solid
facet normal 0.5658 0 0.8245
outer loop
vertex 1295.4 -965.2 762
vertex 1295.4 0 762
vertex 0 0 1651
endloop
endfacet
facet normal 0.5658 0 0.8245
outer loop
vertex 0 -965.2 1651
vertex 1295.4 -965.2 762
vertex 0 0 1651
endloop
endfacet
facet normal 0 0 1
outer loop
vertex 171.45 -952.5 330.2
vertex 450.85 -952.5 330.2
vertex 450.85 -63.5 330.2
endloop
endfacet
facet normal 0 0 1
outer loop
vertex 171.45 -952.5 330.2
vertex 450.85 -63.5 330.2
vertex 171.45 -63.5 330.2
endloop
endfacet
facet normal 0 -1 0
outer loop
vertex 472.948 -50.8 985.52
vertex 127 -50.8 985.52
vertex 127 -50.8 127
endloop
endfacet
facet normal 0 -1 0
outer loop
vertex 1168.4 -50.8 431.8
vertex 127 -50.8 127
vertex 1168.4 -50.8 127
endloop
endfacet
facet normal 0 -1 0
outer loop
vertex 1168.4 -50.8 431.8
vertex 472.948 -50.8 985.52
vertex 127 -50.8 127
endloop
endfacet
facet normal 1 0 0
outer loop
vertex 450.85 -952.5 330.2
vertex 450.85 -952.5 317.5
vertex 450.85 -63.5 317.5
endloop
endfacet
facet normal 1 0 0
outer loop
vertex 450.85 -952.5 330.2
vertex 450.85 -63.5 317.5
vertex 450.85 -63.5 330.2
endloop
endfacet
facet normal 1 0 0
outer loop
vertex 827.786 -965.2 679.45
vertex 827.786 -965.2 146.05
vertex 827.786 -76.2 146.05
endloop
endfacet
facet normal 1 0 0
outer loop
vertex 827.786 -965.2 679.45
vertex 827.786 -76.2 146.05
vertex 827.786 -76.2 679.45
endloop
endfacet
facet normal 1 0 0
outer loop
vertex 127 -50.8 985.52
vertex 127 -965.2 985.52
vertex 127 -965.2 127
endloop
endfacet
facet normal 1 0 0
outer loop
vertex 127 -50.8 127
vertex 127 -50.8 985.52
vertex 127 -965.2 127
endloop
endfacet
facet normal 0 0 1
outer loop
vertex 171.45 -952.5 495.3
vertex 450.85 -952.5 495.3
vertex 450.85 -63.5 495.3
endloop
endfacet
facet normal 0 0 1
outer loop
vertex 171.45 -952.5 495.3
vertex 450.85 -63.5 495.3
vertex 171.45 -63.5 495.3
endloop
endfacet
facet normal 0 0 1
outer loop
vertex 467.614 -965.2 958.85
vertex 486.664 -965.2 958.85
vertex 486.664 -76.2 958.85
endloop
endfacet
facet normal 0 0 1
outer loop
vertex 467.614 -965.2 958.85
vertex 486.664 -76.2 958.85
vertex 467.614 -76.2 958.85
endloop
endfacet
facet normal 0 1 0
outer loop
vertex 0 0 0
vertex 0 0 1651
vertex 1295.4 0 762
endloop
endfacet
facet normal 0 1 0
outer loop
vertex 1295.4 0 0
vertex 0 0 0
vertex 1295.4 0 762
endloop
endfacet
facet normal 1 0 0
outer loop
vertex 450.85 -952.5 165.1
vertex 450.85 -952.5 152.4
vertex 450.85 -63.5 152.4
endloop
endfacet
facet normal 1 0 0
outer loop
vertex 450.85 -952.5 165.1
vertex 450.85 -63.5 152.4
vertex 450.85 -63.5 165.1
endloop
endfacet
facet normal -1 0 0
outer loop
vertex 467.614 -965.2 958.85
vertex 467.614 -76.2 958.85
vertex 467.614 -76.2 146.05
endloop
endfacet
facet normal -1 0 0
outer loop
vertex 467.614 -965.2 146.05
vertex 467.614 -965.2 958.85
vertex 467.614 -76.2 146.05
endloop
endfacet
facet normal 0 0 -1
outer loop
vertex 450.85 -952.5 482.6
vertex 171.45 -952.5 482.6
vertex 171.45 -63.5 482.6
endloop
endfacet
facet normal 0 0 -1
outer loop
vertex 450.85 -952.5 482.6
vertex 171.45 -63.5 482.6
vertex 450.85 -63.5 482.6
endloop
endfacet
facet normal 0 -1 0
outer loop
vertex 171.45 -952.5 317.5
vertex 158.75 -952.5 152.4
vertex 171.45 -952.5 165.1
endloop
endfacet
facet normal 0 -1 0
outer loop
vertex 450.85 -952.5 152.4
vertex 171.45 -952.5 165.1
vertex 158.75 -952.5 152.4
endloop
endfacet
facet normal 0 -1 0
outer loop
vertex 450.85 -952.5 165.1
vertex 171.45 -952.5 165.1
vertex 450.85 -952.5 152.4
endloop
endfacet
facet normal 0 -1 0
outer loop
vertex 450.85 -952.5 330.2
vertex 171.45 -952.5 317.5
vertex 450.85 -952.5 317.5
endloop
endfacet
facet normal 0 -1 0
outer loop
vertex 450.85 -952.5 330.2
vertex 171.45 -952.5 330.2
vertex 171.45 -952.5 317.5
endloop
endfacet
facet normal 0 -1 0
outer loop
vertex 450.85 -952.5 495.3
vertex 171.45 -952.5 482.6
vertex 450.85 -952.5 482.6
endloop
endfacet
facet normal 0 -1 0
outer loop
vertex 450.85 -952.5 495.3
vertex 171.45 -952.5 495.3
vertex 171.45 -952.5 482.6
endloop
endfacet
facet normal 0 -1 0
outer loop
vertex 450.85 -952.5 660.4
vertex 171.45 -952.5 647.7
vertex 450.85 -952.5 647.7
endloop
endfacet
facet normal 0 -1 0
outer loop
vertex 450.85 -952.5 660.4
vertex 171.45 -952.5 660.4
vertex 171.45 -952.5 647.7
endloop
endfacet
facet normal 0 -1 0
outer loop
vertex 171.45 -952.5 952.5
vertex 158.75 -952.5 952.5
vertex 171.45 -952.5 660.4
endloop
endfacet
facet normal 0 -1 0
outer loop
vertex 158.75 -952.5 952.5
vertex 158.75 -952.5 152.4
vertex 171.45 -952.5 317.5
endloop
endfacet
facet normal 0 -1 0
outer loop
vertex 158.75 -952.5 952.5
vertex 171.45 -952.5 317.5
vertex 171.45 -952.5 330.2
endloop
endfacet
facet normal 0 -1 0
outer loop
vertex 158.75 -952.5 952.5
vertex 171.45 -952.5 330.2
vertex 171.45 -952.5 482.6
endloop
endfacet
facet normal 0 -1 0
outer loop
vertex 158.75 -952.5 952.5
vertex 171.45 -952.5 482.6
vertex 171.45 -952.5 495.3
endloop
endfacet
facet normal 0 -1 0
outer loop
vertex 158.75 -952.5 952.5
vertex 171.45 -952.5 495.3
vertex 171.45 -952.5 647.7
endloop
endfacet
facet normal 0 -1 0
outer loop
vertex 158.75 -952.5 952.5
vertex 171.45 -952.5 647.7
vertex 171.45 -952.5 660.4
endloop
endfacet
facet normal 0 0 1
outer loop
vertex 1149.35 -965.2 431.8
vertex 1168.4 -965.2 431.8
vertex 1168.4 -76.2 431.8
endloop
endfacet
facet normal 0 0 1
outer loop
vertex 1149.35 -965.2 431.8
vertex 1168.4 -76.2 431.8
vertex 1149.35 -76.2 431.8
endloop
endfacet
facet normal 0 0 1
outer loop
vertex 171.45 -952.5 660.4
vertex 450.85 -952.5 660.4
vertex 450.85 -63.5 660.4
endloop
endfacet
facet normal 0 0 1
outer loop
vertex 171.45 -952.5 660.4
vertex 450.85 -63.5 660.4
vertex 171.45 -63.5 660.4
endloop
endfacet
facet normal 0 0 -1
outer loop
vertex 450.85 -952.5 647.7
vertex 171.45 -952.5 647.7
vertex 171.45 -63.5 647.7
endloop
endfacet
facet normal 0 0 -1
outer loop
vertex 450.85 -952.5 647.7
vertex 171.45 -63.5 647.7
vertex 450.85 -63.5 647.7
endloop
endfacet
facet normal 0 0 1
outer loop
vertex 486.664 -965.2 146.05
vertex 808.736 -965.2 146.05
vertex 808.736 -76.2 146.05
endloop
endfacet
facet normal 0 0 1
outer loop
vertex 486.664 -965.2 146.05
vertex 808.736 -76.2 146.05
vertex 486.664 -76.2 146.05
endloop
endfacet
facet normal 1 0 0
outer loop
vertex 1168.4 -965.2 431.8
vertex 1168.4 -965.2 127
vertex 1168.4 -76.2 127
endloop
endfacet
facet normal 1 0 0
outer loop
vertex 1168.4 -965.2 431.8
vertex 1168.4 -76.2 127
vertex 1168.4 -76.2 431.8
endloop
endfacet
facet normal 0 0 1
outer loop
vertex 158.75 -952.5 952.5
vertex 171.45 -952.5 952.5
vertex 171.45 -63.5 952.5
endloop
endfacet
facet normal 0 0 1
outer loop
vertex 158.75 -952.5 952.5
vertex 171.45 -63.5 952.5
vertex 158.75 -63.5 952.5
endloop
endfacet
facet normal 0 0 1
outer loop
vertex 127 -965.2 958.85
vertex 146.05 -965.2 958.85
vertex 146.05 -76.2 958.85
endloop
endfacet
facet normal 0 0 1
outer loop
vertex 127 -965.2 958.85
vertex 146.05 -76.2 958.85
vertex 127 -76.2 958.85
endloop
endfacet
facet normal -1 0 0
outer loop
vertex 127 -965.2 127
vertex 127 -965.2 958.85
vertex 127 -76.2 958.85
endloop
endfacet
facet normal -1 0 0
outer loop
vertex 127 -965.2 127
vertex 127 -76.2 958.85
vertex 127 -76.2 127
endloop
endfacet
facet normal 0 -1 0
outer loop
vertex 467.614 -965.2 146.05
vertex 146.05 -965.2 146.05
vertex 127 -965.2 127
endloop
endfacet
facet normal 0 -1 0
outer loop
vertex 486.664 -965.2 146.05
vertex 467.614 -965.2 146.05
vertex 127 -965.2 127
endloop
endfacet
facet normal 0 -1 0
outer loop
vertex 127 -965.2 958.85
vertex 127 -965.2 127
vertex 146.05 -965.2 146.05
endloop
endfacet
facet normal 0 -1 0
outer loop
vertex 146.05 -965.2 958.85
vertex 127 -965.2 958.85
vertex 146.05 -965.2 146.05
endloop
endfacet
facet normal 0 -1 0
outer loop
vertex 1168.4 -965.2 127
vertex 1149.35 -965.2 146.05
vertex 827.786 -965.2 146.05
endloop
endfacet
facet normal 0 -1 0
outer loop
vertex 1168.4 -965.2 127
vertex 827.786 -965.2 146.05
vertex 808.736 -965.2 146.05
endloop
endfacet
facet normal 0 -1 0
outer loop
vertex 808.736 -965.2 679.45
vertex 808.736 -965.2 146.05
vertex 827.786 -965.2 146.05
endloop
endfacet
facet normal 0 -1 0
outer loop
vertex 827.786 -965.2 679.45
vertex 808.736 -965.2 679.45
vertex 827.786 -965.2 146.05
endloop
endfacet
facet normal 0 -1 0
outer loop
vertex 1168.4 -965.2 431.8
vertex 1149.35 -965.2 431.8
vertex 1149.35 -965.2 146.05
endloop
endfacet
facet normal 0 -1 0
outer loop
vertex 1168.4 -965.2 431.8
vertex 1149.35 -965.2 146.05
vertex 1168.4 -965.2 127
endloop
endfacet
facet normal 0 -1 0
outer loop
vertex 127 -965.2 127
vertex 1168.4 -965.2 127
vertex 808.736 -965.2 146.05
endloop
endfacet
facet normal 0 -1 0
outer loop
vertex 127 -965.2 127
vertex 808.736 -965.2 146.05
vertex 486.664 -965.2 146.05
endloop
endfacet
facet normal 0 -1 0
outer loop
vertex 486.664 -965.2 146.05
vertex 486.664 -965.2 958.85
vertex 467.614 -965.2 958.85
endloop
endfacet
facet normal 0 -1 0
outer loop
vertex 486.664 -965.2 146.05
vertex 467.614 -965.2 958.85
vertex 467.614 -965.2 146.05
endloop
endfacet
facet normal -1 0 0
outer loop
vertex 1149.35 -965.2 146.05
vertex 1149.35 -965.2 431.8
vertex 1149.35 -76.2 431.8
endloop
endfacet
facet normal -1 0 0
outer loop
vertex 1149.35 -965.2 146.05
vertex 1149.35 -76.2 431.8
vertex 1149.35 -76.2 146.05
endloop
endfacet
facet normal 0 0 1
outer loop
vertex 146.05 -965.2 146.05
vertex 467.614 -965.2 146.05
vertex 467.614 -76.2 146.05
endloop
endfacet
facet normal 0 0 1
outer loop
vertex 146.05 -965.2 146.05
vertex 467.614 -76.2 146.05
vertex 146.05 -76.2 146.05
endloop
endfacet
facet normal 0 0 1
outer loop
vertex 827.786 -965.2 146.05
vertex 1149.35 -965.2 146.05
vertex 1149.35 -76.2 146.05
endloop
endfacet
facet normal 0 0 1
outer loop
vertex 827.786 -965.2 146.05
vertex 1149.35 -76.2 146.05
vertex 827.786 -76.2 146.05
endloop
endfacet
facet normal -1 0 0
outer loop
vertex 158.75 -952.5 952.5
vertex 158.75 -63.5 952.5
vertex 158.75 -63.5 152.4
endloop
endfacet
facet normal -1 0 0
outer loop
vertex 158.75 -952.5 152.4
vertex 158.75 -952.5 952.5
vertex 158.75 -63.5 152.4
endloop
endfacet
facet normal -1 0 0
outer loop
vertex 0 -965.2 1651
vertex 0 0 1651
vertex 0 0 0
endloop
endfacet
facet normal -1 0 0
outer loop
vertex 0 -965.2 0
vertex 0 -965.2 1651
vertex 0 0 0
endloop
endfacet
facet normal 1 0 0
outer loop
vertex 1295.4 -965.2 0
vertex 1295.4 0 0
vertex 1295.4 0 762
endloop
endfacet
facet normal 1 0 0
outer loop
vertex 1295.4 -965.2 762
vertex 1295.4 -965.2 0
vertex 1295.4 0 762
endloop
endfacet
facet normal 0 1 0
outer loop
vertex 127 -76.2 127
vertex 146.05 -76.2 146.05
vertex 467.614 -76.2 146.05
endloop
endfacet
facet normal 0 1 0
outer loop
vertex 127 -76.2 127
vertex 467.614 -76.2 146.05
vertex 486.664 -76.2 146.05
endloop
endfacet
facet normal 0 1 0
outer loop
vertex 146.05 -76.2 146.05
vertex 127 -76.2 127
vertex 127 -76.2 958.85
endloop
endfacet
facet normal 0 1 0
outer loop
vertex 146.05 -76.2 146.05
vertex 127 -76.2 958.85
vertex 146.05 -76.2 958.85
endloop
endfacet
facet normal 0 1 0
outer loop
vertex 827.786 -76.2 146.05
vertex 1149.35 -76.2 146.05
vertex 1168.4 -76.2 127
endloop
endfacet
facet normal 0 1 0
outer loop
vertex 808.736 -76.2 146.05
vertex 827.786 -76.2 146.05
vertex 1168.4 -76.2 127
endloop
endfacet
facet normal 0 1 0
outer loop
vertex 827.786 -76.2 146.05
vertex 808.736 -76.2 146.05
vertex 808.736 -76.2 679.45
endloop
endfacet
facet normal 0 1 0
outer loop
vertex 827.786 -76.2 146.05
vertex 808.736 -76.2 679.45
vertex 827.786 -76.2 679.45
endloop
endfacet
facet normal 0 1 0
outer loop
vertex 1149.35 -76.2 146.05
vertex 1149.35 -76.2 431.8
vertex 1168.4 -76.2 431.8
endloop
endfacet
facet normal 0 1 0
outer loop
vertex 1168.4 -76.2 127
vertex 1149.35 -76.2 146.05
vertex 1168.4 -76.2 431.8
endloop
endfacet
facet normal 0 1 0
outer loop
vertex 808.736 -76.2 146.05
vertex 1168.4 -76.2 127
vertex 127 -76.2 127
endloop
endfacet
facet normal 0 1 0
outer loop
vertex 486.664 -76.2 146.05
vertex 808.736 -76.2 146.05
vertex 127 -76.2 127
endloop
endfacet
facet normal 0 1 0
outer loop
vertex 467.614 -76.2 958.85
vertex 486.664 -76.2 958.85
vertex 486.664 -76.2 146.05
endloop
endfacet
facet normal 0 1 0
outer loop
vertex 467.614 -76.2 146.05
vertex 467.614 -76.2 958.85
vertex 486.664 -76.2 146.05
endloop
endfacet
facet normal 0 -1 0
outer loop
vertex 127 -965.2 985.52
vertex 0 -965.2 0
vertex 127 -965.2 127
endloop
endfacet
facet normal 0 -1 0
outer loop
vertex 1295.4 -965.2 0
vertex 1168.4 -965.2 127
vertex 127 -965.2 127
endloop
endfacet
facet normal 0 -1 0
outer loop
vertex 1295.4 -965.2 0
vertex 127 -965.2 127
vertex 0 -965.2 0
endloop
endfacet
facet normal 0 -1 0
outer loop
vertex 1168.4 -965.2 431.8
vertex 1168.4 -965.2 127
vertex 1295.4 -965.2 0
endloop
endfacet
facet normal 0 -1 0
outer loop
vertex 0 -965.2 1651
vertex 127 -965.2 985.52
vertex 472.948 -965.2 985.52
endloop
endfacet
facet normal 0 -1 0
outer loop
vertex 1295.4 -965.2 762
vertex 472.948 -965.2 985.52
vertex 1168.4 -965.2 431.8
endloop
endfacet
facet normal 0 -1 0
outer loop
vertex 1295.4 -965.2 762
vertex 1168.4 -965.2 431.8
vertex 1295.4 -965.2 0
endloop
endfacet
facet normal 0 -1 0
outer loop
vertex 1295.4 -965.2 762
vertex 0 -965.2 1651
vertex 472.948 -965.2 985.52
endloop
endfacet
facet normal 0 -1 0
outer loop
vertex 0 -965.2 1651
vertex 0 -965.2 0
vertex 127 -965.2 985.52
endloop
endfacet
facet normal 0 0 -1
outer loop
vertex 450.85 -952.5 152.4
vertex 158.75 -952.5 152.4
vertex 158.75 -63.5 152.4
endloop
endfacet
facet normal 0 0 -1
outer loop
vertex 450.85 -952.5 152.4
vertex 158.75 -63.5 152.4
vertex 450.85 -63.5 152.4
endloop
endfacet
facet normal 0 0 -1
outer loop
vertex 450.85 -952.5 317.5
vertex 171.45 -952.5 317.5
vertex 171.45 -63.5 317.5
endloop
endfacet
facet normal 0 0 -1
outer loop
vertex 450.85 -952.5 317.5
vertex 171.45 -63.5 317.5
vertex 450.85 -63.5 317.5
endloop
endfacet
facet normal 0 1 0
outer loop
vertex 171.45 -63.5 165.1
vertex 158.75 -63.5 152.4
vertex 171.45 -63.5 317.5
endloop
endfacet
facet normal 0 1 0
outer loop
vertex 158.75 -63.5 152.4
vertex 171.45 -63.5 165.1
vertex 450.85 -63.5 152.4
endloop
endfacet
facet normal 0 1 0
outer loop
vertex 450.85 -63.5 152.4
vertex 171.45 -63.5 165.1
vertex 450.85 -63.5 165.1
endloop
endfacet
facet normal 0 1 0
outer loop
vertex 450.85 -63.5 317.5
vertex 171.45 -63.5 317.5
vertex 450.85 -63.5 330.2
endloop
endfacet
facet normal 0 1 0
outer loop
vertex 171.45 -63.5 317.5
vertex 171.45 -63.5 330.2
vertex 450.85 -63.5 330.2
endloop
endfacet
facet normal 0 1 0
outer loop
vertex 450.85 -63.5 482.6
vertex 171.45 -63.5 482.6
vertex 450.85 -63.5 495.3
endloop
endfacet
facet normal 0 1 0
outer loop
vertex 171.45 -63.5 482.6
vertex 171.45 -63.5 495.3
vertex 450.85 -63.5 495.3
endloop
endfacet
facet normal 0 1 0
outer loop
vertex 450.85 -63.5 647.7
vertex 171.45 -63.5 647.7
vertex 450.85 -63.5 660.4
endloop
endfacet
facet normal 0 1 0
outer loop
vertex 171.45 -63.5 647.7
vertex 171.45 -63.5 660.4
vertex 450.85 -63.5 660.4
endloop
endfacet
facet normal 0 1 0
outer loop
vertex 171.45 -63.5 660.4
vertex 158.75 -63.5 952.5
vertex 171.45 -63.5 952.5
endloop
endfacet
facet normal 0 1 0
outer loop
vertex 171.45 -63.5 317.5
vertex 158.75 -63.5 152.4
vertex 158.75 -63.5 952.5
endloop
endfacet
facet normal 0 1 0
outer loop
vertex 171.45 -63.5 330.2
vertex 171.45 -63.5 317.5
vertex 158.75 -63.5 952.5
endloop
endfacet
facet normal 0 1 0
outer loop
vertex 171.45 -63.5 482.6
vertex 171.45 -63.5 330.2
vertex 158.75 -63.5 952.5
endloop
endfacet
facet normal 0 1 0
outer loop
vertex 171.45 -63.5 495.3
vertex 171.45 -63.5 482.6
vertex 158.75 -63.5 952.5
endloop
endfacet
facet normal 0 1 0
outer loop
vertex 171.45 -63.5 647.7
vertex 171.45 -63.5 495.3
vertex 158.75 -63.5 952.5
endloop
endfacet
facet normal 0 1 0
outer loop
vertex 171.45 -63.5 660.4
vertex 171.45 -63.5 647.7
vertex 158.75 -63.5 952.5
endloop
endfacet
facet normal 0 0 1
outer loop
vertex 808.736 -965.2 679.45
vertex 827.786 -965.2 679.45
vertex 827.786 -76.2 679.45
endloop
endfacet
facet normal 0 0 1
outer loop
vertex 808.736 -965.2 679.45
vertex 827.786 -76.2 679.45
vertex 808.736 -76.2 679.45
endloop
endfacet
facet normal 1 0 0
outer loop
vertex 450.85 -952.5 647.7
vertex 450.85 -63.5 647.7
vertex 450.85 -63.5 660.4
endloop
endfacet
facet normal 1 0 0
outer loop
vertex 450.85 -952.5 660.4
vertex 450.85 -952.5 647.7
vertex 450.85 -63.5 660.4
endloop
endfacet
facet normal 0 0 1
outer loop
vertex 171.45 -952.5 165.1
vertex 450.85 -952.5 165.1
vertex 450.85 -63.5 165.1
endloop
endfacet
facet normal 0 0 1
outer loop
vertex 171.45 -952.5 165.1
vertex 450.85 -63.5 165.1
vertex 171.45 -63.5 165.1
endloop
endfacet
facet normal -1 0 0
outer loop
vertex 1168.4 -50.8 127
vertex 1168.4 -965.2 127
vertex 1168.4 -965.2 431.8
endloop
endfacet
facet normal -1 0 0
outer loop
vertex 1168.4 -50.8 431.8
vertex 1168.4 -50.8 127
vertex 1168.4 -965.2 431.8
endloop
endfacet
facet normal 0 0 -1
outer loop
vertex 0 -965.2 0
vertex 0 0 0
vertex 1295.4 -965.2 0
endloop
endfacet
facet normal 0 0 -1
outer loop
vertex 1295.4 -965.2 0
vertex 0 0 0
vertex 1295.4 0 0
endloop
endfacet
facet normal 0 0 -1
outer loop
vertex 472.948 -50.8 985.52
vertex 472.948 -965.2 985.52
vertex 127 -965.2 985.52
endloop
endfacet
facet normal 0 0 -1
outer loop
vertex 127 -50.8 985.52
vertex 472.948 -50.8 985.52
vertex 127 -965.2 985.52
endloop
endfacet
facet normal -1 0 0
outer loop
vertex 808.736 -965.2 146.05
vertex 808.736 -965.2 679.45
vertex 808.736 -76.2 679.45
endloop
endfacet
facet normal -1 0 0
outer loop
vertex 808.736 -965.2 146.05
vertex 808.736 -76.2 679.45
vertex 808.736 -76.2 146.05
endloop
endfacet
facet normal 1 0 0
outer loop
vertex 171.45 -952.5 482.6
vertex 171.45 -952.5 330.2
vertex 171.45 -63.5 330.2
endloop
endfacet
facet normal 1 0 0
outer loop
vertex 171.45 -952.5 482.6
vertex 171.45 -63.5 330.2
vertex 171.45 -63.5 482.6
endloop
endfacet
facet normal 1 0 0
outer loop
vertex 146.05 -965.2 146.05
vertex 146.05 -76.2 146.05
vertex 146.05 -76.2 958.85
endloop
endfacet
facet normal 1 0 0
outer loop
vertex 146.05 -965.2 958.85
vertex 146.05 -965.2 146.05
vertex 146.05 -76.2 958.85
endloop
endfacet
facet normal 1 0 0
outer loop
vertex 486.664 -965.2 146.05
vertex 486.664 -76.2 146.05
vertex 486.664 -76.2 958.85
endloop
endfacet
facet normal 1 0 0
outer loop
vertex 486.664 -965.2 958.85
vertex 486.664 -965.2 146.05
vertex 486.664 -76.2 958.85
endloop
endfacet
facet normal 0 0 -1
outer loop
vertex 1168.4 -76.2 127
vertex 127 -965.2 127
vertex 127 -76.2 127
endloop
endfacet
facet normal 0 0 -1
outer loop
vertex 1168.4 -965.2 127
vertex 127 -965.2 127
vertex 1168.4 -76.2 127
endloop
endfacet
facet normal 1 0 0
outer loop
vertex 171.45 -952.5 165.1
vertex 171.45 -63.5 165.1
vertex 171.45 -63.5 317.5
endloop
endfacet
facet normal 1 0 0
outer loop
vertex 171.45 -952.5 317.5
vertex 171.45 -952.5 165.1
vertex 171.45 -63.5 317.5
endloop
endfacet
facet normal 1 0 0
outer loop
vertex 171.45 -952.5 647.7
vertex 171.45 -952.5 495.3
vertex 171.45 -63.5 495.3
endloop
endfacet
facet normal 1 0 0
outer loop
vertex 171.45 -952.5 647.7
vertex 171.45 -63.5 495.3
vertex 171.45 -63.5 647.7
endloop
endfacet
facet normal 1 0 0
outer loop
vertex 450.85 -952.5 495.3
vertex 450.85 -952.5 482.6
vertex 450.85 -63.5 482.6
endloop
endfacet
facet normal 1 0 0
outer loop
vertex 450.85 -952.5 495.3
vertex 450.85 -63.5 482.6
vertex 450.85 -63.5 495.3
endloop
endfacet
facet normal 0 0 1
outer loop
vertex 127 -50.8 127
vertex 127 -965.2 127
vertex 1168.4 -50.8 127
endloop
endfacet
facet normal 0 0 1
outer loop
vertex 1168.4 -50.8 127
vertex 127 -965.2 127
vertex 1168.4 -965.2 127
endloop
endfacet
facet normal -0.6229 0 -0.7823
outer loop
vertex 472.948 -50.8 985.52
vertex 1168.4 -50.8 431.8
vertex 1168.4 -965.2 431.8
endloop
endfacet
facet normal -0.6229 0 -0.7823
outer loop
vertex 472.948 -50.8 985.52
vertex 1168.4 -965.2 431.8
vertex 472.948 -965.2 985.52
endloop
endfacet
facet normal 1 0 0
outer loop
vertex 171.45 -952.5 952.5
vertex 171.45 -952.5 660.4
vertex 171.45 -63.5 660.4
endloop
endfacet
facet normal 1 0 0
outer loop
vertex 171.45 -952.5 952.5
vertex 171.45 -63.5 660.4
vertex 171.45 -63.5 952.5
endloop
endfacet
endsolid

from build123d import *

# Parameters (mm, degrees)
F1_DEPTH = 965.2
F3_DEPTH = 914.4
F5_DEPTH = 889
F8_DEPTH = 889


with BuildPart() as f1:
    # F0 (on Front) → F1 (new body)
    with BuildSketch(Plane.XZ):
        Polygon((0, 1651), (0, 0), (1295.4, 0), (1295.4, 762), align=None)
    extrude(amount=F1_DEPTH)

    # F2 (on face) → F3 (cut)
    with BuildSketch(Plane.XZ.offset(965.2)):
        Polygon((127, 985.52), (127, 127), (1168.4, 127), (1168.4, 431.8), (472.948, 985.52), align=None)
    extrude(amount=-F3_DEPTH, mode=Mode.SUBTRACT)


with BuildPart() as f5:
    # F4 (on face) → F5 (new body)
    with BuildSketch(Plane.XZ.offset(965.2)):
        Polygon((127, 958.85), (127, 127), (1168.4, 127), (1168.4, 431.8), (1149.35, 431.8), (1149.35, 146.05), (827.786, 146.05), (827.786, 679.45), (808.736, 679.45), (808.736, 146.05), (486.664, 146.05), (486.664, 958.85), (467.614, 958.85), (467.614, 146.05), (146.05, 146.05), (146.05, 958.85), align=None)
    extrude(amount=-F5_DEPTH)


with BuildPart() as f8:
    # F7 (on offset) → F8 (new body)
    with BuildSketch(Plane.XZ.offset(952.5)):
        Polygon((158.75, 952.5), (158.75, 152.4), (450.85, 152.4), (450.85, 165.1), (171.45, 165.1), (171.45, 317.5), (450.85, 317.5), (450.85, 330.2), (171.45, 330.2), (171.45, 482.6), (450.85, 482.6), (450.85, 495.3), (171.45, 495.3), (171.45, 647.7), (450.85, 647.7), (450.85, 660.4), (171.45, 660.4), (171.45, 952.5), align=None)
    extrude(amount=-F8_DEPTH)


solid = Compound([f1.part, f5.part, f8.part])
